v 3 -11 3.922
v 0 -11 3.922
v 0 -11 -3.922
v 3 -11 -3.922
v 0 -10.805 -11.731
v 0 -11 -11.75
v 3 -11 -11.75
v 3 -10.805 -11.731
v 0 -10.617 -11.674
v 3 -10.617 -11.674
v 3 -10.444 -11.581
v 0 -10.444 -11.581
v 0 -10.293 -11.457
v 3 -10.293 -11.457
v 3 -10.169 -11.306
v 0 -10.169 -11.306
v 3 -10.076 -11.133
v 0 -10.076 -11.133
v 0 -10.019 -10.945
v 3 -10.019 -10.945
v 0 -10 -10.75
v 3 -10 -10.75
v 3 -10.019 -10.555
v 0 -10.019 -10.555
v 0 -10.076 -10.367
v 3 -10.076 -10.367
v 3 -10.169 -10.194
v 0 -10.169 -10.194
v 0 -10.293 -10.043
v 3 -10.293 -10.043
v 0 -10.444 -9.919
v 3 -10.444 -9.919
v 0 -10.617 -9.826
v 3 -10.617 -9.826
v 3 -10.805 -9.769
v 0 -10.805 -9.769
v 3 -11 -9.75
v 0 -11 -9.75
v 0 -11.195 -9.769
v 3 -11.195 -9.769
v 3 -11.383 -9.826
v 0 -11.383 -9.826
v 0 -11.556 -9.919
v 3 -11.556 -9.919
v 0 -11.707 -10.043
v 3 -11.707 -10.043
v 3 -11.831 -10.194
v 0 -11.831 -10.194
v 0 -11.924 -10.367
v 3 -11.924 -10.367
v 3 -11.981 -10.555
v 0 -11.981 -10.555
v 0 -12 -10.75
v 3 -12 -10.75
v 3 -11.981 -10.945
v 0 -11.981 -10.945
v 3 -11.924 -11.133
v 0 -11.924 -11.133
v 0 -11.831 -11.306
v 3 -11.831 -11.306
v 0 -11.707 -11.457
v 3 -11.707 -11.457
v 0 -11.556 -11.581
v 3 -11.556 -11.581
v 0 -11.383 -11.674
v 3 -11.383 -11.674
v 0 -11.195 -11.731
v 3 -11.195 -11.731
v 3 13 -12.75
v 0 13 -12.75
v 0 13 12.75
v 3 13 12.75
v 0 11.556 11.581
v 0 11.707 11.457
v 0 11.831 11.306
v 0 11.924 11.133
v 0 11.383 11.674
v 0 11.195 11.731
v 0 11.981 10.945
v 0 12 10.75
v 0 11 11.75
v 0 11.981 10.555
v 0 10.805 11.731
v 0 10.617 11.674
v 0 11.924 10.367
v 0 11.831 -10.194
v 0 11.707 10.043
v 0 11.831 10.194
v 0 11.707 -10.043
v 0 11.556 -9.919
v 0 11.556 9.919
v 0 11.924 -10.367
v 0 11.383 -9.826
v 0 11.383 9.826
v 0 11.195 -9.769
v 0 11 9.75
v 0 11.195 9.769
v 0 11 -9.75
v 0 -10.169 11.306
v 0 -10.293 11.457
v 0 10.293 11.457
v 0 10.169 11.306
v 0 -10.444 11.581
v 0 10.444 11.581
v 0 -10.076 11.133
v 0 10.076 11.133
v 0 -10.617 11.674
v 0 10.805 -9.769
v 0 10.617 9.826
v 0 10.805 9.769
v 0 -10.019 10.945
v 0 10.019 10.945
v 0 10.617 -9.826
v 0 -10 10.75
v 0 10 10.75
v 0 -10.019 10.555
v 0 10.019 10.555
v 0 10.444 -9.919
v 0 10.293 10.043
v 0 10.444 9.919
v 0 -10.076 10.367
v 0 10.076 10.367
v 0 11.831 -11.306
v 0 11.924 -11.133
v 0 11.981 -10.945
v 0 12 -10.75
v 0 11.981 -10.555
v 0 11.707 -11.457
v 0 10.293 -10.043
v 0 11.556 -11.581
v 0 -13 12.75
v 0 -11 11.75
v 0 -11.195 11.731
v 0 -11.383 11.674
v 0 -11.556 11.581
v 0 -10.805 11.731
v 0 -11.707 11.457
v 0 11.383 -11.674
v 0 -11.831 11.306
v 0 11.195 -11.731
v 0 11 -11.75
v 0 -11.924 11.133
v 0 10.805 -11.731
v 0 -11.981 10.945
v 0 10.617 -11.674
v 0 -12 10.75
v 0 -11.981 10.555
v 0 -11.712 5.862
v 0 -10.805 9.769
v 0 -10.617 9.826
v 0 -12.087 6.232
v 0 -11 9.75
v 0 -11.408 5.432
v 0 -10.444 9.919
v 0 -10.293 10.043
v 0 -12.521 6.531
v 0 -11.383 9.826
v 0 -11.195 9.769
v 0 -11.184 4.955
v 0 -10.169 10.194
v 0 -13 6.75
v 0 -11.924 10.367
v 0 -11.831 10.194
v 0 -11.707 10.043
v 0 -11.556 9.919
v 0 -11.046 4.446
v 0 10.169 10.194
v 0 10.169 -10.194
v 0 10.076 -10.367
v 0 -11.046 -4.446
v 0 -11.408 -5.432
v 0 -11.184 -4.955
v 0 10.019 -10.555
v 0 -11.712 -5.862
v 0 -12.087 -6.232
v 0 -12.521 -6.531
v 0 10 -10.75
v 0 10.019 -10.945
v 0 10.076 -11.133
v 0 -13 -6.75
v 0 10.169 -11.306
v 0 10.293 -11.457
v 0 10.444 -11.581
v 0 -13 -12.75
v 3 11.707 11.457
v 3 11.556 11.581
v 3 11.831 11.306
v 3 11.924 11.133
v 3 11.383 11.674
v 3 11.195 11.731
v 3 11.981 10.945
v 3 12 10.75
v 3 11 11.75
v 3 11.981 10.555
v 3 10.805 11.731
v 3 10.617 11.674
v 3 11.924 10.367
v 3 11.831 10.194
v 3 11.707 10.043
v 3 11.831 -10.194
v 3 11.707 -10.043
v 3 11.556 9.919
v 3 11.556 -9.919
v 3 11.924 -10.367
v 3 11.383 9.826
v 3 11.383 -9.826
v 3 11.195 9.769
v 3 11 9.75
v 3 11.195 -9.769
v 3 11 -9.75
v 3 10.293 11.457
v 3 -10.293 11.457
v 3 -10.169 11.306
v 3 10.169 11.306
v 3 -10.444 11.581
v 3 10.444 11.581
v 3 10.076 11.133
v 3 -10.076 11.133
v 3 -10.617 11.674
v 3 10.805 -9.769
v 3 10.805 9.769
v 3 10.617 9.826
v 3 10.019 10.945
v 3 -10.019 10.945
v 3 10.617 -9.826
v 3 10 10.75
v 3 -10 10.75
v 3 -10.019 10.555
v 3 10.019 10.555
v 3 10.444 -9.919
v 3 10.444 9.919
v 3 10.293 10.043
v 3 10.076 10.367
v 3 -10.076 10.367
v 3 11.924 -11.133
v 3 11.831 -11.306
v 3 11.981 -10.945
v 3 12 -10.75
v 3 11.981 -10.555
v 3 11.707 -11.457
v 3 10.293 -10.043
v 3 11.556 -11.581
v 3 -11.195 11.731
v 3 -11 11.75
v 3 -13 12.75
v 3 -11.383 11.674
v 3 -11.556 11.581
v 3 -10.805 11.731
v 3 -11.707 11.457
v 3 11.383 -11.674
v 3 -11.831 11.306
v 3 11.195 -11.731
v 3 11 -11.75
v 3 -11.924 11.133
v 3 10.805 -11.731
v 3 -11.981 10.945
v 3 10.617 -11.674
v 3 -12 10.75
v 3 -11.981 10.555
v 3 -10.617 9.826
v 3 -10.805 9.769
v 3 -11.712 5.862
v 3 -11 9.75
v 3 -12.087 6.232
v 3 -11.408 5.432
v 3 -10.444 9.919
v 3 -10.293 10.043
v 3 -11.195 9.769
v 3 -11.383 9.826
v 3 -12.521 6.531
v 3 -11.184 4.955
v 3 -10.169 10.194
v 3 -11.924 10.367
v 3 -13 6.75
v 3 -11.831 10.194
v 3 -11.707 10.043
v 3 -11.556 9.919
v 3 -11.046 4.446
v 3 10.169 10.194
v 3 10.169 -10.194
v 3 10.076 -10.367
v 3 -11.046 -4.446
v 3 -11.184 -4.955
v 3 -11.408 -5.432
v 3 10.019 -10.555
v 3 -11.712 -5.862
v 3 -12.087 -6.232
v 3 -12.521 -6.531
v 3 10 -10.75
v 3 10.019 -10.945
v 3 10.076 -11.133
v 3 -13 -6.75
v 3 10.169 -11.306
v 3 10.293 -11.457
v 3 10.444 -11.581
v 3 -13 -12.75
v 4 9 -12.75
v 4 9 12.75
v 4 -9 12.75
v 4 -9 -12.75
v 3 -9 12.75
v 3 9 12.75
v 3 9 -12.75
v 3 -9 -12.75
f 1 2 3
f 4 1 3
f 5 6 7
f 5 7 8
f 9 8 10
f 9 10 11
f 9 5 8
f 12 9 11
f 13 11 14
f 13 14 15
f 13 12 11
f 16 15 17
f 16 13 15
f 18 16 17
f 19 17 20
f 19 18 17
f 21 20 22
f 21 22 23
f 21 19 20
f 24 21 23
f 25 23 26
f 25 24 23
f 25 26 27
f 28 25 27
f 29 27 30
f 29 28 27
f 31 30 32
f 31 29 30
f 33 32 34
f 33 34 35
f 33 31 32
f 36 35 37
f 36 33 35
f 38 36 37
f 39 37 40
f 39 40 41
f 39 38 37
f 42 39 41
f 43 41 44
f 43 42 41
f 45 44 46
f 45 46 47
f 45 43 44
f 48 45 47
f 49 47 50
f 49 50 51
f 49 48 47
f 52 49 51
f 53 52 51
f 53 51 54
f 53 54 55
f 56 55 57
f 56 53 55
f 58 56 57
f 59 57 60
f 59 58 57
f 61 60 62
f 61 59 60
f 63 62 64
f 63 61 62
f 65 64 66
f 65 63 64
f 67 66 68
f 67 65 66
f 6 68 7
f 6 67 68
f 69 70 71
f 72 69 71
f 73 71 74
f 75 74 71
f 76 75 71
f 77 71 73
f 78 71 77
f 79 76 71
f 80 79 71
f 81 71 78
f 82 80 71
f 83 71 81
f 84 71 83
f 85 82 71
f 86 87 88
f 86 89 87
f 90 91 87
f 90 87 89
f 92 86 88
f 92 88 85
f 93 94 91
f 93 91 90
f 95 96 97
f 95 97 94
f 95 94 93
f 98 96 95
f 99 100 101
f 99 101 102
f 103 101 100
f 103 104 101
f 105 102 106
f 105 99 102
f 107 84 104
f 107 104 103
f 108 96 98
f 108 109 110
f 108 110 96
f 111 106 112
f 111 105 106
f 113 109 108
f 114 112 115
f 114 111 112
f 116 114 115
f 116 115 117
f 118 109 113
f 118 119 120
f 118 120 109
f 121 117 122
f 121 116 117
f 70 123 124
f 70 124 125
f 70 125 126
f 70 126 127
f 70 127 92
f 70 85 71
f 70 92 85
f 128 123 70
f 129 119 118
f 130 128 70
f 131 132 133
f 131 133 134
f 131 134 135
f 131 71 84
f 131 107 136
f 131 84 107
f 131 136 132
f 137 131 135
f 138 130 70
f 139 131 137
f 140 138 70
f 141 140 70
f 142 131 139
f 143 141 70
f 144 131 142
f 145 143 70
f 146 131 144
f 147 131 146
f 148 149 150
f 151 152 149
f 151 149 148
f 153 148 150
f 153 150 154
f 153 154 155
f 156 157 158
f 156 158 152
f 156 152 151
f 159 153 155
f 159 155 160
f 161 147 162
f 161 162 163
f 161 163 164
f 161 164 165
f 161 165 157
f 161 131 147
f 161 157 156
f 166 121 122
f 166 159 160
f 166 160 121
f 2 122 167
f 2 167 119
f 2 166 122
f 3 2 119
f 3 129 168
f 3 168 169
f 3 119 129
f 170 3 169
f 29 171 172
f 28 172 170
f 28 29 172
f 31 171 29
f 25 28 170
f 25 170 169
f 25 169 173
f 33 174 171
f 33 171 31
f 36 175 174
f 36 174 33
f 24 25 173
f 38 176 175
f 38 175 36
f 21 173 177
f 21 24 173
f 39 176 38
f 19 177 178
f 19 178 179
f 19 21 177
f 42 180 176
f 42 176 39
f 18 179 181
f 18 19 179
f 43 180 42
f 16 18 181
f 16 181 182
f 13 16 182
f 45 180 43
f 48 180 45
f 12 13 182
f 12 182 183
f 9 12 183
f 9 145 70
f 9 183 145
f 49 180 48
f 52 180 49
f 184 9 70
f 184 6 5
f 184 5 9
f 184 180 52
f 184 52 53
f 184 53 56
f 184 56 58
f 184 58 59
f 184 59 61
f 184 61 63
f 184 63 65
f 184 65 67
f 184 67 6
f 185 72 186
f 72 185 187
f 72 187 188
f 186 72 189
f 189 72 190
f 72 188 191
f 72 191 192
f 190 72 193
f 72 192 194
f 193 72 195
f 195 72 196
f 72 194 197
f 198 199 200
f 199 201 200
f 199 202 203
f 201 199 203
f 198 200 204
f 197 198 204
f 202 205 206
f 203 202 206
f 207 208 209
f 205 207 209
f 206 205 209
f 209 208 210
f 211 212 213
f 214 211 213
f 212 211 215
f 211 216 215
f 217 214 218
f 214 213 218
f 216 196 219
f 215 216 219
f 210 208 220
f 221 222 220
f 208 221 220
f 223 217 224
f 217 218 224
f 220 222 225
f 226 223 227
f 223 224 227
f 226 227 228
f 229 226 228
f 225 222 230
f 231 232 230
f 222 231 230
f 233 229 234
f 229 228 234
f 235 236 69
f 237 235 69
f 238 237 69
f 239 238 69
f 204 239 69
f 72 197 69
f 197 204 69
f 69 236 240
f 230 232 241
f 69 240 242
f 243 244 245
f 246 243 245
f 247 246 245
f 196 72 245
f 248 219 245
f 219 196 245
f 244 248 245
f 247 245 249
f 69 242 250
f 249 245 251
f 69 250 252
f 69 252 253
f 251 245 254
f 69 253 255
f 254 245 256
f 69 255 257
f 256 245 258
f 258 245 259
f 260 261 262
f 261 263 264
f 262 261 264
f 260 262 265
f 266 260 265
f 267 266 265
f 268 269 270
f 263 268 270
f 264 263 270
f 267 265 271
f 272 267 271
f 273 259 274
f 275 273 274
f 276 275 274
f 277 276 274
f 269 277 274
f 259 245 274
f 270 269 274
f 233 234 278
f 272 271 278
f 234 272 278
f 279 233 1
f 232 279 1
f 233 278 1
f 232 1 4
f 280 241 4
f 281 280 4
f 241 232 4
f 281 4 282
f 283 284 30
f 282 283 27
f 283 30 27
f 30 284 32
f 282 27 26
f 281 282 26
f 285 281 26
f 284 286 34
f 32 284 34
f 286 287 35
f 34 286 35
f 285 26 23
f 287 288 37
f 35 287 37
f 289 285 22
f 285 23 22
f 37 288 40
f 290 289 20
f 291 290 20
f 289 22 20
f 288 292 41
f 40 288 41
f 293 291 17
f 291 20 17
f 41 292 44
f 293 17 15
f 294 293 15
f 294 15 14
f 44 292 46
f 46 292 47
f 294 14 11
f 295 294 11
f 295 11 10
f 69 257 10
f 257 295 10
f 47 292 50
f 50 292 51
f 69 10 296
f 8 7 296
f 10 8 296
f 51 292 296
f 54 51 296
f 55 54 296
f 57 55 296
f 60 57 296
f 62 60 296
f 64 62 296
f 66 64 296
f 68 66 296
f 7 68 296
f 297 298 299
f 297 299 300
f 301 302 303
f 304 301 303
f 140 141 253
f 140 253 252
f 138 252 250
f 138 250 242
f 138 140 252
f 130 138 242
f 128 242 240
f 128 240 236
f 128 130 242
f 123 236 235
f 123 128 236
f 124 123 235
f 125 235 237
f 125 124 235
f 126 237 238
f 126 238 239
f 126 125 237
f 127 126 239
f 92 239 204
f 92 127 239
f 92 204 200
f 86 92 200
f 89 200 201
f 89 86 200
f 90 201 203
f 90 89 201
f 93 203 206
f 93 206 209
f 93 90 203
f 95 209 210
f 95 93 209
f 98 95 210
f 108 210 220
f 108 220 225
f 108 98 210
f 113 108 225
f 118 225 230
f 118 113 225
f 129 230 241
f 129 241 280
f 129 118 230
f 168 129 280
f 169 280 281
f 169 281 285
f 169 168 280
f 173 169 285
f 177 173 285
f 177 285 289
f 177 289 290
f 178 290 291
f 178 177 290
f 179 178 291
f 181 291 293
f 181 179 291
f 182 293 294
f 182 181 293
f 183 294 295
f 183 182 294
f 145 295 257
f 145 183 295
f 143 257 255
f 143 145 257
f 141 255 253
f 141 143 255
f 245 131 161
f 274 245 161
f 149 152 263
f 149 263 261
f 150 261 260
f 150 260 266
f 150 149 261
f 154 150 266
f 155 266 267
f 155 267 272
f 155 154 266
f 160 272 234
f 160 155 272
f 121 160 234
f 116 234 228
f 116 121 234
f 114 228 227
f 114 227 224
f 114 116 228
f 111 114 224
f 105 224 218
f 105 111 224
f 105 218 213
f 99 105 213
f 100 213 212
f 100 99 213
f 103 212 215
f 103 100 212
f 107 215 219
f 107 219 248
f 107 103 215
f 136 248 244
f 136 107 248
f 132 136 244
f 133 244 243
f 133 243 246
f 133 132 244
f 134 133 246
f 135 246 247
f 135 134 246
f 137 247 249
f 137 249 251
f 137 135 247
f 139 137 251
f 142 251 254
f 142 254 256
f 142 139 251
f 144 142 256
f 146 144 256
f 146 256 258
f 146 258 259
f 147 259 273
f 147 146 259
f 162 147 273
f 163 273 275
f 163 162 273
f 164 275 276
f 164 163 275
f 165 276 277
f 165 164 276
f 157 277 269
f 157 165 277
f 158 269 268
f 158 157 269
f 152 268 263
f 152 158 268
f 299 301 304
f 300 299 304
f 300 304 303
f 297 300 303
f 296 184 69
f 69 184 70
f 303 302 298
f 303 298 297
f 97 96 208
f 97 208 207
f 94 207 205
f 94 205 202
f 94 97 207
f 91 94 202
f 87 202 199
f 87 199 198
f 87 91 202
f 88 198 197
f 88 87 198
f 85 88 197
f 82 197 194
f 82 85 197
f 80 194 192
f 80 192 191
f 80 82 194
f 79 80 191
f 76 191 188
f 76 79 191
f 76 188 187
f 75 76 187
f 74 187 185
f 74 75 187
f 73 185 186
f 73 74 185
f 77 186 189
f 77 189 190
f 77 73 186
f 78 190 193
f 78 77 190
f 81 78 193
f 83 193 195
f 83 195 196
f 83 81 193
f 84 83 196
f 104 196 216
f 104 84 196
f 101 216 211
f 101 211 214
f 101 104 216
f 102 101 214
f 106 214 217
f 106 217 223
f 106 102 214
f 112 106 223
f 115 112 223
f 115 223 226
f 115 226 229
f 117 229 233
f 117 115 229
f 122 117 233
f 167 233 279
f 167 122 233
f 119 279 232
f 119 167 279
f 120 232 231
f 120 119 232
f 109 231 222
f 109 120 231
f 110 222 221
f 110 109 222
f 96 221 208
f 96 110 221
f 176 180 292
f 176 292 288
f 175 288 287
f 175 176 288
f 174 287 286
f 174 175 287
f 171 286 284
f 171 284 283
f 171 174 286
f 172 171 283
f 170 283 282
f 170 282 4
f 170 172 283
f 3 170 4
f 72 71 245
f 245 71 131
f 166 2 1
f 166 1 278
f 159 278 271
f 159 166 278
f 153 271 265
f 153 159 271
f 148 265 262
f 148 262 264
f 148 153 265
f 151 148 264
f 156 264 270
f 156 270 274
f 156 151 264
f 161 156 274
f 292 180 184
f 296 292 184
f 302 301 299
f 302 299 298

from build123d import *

# Parameters (mm, degrees)
SKETCH_1_R      = 1
EXTRUDE_1_DEPTH = 3
FILLET_1_R      = 3
SKETCH_2_W      = 25.5
SKETCH_2_H      = 18
EXTRUDE_2_DEPTH = 1


with BuildPart() as part:
    # 草图1 → 凸台-拉伸1 (new body)
    with BuildSketch(Plane(origin=(0, 0, 0), x_dir=(0, 0, -1), z_dir=(1, 0, 0))):
        Polygon((-12.75, -13), (-6.75, -13), (-6.75, -11), (6.75, -11), (6.75, -13), (12.75, -13), (12.75, 13), (-12.75, 13), align=None)
        with Locations((-10.75, -11)):
            Circle(SKETCH_1_R, mode=Mode.SUBTRACT)
        with Locations((-10.75, 11)):
            Circle(SKETCH_1_R, mode=Mode.SUBTRACT)
        with Locations((10.75, 11)):
            Circle(SKETCH_1_R, mode=Mode.SUBTRACT)
        with Locations((10.75, -11)):
            Circle(SKETCH_1_R, mode=Mode.SUBTRACT)
    extrude(amount=EXTRUDE_1_DEPTH)

    # 圆角1
    # the kernel refuses this fillet: 3 mm, written as the material it adds along each edge
    with BuildSketch(Plane(origin=(0, -11, 6.75), x_dir=(0, -1, 0), z_dir=(1, 0, 0))) as fillet_1_piece_1:
        with BuildLine():
            CenterArc((3, 2.828427125), FILLET_1_R, 180, 70.528779366)
            Line((0, 2.828427125), (-0.06, 2.828427125))
            Line((-0.06, 2.828427125), (-0.06, 0))
            Line((-0.06, 0), (0, -0.06))
            ThreePointArc((0, -0.06), (1, -0.06), (1.98, -0.056568542))
            Line((1.98, -0.056568542), (2, 0))
        make_face()
    extrude(amount=3)
    with BuildSketch(Plane(origin=(0, -11, -6.75), x_dir=(0, 0, 1), z_dir=(1, 0, 0))) as fillet_1_piece_2:
        with BuildLine():
            CenterArc((2.828427125, 3), FILLET_1_R, 199.471220634, 70.528779366)
            Line((0, 2), (-0.056568542, 1.98))
            ThreePointArc((-0.056568542, 1.98), (-0.06, 1), (-0.06, 0))
            Line((-0.06, 0), (0, -0.06))
            Line((0, -0.06), (2.828427125, -0.06))
            Line((2.828427125, -0.06), (2.828427125, 0))
        make_face()
    extrude(amount=3)


with BuildPart() as body_2:
    # 草图2 → 凸台-拉伸2 (new body)
    with BuildSketch(Plane(origin=(3, 0, 0), x_dir=(0, 0, -1), z_dir=(1, 0, 0))):
        Rectangle(SKETCH_2_W, SKETCH_2_H)
    extrude(amount=EXTRUDE_2_DEPTH)


solid = Compound([part.part, body_2.part])
